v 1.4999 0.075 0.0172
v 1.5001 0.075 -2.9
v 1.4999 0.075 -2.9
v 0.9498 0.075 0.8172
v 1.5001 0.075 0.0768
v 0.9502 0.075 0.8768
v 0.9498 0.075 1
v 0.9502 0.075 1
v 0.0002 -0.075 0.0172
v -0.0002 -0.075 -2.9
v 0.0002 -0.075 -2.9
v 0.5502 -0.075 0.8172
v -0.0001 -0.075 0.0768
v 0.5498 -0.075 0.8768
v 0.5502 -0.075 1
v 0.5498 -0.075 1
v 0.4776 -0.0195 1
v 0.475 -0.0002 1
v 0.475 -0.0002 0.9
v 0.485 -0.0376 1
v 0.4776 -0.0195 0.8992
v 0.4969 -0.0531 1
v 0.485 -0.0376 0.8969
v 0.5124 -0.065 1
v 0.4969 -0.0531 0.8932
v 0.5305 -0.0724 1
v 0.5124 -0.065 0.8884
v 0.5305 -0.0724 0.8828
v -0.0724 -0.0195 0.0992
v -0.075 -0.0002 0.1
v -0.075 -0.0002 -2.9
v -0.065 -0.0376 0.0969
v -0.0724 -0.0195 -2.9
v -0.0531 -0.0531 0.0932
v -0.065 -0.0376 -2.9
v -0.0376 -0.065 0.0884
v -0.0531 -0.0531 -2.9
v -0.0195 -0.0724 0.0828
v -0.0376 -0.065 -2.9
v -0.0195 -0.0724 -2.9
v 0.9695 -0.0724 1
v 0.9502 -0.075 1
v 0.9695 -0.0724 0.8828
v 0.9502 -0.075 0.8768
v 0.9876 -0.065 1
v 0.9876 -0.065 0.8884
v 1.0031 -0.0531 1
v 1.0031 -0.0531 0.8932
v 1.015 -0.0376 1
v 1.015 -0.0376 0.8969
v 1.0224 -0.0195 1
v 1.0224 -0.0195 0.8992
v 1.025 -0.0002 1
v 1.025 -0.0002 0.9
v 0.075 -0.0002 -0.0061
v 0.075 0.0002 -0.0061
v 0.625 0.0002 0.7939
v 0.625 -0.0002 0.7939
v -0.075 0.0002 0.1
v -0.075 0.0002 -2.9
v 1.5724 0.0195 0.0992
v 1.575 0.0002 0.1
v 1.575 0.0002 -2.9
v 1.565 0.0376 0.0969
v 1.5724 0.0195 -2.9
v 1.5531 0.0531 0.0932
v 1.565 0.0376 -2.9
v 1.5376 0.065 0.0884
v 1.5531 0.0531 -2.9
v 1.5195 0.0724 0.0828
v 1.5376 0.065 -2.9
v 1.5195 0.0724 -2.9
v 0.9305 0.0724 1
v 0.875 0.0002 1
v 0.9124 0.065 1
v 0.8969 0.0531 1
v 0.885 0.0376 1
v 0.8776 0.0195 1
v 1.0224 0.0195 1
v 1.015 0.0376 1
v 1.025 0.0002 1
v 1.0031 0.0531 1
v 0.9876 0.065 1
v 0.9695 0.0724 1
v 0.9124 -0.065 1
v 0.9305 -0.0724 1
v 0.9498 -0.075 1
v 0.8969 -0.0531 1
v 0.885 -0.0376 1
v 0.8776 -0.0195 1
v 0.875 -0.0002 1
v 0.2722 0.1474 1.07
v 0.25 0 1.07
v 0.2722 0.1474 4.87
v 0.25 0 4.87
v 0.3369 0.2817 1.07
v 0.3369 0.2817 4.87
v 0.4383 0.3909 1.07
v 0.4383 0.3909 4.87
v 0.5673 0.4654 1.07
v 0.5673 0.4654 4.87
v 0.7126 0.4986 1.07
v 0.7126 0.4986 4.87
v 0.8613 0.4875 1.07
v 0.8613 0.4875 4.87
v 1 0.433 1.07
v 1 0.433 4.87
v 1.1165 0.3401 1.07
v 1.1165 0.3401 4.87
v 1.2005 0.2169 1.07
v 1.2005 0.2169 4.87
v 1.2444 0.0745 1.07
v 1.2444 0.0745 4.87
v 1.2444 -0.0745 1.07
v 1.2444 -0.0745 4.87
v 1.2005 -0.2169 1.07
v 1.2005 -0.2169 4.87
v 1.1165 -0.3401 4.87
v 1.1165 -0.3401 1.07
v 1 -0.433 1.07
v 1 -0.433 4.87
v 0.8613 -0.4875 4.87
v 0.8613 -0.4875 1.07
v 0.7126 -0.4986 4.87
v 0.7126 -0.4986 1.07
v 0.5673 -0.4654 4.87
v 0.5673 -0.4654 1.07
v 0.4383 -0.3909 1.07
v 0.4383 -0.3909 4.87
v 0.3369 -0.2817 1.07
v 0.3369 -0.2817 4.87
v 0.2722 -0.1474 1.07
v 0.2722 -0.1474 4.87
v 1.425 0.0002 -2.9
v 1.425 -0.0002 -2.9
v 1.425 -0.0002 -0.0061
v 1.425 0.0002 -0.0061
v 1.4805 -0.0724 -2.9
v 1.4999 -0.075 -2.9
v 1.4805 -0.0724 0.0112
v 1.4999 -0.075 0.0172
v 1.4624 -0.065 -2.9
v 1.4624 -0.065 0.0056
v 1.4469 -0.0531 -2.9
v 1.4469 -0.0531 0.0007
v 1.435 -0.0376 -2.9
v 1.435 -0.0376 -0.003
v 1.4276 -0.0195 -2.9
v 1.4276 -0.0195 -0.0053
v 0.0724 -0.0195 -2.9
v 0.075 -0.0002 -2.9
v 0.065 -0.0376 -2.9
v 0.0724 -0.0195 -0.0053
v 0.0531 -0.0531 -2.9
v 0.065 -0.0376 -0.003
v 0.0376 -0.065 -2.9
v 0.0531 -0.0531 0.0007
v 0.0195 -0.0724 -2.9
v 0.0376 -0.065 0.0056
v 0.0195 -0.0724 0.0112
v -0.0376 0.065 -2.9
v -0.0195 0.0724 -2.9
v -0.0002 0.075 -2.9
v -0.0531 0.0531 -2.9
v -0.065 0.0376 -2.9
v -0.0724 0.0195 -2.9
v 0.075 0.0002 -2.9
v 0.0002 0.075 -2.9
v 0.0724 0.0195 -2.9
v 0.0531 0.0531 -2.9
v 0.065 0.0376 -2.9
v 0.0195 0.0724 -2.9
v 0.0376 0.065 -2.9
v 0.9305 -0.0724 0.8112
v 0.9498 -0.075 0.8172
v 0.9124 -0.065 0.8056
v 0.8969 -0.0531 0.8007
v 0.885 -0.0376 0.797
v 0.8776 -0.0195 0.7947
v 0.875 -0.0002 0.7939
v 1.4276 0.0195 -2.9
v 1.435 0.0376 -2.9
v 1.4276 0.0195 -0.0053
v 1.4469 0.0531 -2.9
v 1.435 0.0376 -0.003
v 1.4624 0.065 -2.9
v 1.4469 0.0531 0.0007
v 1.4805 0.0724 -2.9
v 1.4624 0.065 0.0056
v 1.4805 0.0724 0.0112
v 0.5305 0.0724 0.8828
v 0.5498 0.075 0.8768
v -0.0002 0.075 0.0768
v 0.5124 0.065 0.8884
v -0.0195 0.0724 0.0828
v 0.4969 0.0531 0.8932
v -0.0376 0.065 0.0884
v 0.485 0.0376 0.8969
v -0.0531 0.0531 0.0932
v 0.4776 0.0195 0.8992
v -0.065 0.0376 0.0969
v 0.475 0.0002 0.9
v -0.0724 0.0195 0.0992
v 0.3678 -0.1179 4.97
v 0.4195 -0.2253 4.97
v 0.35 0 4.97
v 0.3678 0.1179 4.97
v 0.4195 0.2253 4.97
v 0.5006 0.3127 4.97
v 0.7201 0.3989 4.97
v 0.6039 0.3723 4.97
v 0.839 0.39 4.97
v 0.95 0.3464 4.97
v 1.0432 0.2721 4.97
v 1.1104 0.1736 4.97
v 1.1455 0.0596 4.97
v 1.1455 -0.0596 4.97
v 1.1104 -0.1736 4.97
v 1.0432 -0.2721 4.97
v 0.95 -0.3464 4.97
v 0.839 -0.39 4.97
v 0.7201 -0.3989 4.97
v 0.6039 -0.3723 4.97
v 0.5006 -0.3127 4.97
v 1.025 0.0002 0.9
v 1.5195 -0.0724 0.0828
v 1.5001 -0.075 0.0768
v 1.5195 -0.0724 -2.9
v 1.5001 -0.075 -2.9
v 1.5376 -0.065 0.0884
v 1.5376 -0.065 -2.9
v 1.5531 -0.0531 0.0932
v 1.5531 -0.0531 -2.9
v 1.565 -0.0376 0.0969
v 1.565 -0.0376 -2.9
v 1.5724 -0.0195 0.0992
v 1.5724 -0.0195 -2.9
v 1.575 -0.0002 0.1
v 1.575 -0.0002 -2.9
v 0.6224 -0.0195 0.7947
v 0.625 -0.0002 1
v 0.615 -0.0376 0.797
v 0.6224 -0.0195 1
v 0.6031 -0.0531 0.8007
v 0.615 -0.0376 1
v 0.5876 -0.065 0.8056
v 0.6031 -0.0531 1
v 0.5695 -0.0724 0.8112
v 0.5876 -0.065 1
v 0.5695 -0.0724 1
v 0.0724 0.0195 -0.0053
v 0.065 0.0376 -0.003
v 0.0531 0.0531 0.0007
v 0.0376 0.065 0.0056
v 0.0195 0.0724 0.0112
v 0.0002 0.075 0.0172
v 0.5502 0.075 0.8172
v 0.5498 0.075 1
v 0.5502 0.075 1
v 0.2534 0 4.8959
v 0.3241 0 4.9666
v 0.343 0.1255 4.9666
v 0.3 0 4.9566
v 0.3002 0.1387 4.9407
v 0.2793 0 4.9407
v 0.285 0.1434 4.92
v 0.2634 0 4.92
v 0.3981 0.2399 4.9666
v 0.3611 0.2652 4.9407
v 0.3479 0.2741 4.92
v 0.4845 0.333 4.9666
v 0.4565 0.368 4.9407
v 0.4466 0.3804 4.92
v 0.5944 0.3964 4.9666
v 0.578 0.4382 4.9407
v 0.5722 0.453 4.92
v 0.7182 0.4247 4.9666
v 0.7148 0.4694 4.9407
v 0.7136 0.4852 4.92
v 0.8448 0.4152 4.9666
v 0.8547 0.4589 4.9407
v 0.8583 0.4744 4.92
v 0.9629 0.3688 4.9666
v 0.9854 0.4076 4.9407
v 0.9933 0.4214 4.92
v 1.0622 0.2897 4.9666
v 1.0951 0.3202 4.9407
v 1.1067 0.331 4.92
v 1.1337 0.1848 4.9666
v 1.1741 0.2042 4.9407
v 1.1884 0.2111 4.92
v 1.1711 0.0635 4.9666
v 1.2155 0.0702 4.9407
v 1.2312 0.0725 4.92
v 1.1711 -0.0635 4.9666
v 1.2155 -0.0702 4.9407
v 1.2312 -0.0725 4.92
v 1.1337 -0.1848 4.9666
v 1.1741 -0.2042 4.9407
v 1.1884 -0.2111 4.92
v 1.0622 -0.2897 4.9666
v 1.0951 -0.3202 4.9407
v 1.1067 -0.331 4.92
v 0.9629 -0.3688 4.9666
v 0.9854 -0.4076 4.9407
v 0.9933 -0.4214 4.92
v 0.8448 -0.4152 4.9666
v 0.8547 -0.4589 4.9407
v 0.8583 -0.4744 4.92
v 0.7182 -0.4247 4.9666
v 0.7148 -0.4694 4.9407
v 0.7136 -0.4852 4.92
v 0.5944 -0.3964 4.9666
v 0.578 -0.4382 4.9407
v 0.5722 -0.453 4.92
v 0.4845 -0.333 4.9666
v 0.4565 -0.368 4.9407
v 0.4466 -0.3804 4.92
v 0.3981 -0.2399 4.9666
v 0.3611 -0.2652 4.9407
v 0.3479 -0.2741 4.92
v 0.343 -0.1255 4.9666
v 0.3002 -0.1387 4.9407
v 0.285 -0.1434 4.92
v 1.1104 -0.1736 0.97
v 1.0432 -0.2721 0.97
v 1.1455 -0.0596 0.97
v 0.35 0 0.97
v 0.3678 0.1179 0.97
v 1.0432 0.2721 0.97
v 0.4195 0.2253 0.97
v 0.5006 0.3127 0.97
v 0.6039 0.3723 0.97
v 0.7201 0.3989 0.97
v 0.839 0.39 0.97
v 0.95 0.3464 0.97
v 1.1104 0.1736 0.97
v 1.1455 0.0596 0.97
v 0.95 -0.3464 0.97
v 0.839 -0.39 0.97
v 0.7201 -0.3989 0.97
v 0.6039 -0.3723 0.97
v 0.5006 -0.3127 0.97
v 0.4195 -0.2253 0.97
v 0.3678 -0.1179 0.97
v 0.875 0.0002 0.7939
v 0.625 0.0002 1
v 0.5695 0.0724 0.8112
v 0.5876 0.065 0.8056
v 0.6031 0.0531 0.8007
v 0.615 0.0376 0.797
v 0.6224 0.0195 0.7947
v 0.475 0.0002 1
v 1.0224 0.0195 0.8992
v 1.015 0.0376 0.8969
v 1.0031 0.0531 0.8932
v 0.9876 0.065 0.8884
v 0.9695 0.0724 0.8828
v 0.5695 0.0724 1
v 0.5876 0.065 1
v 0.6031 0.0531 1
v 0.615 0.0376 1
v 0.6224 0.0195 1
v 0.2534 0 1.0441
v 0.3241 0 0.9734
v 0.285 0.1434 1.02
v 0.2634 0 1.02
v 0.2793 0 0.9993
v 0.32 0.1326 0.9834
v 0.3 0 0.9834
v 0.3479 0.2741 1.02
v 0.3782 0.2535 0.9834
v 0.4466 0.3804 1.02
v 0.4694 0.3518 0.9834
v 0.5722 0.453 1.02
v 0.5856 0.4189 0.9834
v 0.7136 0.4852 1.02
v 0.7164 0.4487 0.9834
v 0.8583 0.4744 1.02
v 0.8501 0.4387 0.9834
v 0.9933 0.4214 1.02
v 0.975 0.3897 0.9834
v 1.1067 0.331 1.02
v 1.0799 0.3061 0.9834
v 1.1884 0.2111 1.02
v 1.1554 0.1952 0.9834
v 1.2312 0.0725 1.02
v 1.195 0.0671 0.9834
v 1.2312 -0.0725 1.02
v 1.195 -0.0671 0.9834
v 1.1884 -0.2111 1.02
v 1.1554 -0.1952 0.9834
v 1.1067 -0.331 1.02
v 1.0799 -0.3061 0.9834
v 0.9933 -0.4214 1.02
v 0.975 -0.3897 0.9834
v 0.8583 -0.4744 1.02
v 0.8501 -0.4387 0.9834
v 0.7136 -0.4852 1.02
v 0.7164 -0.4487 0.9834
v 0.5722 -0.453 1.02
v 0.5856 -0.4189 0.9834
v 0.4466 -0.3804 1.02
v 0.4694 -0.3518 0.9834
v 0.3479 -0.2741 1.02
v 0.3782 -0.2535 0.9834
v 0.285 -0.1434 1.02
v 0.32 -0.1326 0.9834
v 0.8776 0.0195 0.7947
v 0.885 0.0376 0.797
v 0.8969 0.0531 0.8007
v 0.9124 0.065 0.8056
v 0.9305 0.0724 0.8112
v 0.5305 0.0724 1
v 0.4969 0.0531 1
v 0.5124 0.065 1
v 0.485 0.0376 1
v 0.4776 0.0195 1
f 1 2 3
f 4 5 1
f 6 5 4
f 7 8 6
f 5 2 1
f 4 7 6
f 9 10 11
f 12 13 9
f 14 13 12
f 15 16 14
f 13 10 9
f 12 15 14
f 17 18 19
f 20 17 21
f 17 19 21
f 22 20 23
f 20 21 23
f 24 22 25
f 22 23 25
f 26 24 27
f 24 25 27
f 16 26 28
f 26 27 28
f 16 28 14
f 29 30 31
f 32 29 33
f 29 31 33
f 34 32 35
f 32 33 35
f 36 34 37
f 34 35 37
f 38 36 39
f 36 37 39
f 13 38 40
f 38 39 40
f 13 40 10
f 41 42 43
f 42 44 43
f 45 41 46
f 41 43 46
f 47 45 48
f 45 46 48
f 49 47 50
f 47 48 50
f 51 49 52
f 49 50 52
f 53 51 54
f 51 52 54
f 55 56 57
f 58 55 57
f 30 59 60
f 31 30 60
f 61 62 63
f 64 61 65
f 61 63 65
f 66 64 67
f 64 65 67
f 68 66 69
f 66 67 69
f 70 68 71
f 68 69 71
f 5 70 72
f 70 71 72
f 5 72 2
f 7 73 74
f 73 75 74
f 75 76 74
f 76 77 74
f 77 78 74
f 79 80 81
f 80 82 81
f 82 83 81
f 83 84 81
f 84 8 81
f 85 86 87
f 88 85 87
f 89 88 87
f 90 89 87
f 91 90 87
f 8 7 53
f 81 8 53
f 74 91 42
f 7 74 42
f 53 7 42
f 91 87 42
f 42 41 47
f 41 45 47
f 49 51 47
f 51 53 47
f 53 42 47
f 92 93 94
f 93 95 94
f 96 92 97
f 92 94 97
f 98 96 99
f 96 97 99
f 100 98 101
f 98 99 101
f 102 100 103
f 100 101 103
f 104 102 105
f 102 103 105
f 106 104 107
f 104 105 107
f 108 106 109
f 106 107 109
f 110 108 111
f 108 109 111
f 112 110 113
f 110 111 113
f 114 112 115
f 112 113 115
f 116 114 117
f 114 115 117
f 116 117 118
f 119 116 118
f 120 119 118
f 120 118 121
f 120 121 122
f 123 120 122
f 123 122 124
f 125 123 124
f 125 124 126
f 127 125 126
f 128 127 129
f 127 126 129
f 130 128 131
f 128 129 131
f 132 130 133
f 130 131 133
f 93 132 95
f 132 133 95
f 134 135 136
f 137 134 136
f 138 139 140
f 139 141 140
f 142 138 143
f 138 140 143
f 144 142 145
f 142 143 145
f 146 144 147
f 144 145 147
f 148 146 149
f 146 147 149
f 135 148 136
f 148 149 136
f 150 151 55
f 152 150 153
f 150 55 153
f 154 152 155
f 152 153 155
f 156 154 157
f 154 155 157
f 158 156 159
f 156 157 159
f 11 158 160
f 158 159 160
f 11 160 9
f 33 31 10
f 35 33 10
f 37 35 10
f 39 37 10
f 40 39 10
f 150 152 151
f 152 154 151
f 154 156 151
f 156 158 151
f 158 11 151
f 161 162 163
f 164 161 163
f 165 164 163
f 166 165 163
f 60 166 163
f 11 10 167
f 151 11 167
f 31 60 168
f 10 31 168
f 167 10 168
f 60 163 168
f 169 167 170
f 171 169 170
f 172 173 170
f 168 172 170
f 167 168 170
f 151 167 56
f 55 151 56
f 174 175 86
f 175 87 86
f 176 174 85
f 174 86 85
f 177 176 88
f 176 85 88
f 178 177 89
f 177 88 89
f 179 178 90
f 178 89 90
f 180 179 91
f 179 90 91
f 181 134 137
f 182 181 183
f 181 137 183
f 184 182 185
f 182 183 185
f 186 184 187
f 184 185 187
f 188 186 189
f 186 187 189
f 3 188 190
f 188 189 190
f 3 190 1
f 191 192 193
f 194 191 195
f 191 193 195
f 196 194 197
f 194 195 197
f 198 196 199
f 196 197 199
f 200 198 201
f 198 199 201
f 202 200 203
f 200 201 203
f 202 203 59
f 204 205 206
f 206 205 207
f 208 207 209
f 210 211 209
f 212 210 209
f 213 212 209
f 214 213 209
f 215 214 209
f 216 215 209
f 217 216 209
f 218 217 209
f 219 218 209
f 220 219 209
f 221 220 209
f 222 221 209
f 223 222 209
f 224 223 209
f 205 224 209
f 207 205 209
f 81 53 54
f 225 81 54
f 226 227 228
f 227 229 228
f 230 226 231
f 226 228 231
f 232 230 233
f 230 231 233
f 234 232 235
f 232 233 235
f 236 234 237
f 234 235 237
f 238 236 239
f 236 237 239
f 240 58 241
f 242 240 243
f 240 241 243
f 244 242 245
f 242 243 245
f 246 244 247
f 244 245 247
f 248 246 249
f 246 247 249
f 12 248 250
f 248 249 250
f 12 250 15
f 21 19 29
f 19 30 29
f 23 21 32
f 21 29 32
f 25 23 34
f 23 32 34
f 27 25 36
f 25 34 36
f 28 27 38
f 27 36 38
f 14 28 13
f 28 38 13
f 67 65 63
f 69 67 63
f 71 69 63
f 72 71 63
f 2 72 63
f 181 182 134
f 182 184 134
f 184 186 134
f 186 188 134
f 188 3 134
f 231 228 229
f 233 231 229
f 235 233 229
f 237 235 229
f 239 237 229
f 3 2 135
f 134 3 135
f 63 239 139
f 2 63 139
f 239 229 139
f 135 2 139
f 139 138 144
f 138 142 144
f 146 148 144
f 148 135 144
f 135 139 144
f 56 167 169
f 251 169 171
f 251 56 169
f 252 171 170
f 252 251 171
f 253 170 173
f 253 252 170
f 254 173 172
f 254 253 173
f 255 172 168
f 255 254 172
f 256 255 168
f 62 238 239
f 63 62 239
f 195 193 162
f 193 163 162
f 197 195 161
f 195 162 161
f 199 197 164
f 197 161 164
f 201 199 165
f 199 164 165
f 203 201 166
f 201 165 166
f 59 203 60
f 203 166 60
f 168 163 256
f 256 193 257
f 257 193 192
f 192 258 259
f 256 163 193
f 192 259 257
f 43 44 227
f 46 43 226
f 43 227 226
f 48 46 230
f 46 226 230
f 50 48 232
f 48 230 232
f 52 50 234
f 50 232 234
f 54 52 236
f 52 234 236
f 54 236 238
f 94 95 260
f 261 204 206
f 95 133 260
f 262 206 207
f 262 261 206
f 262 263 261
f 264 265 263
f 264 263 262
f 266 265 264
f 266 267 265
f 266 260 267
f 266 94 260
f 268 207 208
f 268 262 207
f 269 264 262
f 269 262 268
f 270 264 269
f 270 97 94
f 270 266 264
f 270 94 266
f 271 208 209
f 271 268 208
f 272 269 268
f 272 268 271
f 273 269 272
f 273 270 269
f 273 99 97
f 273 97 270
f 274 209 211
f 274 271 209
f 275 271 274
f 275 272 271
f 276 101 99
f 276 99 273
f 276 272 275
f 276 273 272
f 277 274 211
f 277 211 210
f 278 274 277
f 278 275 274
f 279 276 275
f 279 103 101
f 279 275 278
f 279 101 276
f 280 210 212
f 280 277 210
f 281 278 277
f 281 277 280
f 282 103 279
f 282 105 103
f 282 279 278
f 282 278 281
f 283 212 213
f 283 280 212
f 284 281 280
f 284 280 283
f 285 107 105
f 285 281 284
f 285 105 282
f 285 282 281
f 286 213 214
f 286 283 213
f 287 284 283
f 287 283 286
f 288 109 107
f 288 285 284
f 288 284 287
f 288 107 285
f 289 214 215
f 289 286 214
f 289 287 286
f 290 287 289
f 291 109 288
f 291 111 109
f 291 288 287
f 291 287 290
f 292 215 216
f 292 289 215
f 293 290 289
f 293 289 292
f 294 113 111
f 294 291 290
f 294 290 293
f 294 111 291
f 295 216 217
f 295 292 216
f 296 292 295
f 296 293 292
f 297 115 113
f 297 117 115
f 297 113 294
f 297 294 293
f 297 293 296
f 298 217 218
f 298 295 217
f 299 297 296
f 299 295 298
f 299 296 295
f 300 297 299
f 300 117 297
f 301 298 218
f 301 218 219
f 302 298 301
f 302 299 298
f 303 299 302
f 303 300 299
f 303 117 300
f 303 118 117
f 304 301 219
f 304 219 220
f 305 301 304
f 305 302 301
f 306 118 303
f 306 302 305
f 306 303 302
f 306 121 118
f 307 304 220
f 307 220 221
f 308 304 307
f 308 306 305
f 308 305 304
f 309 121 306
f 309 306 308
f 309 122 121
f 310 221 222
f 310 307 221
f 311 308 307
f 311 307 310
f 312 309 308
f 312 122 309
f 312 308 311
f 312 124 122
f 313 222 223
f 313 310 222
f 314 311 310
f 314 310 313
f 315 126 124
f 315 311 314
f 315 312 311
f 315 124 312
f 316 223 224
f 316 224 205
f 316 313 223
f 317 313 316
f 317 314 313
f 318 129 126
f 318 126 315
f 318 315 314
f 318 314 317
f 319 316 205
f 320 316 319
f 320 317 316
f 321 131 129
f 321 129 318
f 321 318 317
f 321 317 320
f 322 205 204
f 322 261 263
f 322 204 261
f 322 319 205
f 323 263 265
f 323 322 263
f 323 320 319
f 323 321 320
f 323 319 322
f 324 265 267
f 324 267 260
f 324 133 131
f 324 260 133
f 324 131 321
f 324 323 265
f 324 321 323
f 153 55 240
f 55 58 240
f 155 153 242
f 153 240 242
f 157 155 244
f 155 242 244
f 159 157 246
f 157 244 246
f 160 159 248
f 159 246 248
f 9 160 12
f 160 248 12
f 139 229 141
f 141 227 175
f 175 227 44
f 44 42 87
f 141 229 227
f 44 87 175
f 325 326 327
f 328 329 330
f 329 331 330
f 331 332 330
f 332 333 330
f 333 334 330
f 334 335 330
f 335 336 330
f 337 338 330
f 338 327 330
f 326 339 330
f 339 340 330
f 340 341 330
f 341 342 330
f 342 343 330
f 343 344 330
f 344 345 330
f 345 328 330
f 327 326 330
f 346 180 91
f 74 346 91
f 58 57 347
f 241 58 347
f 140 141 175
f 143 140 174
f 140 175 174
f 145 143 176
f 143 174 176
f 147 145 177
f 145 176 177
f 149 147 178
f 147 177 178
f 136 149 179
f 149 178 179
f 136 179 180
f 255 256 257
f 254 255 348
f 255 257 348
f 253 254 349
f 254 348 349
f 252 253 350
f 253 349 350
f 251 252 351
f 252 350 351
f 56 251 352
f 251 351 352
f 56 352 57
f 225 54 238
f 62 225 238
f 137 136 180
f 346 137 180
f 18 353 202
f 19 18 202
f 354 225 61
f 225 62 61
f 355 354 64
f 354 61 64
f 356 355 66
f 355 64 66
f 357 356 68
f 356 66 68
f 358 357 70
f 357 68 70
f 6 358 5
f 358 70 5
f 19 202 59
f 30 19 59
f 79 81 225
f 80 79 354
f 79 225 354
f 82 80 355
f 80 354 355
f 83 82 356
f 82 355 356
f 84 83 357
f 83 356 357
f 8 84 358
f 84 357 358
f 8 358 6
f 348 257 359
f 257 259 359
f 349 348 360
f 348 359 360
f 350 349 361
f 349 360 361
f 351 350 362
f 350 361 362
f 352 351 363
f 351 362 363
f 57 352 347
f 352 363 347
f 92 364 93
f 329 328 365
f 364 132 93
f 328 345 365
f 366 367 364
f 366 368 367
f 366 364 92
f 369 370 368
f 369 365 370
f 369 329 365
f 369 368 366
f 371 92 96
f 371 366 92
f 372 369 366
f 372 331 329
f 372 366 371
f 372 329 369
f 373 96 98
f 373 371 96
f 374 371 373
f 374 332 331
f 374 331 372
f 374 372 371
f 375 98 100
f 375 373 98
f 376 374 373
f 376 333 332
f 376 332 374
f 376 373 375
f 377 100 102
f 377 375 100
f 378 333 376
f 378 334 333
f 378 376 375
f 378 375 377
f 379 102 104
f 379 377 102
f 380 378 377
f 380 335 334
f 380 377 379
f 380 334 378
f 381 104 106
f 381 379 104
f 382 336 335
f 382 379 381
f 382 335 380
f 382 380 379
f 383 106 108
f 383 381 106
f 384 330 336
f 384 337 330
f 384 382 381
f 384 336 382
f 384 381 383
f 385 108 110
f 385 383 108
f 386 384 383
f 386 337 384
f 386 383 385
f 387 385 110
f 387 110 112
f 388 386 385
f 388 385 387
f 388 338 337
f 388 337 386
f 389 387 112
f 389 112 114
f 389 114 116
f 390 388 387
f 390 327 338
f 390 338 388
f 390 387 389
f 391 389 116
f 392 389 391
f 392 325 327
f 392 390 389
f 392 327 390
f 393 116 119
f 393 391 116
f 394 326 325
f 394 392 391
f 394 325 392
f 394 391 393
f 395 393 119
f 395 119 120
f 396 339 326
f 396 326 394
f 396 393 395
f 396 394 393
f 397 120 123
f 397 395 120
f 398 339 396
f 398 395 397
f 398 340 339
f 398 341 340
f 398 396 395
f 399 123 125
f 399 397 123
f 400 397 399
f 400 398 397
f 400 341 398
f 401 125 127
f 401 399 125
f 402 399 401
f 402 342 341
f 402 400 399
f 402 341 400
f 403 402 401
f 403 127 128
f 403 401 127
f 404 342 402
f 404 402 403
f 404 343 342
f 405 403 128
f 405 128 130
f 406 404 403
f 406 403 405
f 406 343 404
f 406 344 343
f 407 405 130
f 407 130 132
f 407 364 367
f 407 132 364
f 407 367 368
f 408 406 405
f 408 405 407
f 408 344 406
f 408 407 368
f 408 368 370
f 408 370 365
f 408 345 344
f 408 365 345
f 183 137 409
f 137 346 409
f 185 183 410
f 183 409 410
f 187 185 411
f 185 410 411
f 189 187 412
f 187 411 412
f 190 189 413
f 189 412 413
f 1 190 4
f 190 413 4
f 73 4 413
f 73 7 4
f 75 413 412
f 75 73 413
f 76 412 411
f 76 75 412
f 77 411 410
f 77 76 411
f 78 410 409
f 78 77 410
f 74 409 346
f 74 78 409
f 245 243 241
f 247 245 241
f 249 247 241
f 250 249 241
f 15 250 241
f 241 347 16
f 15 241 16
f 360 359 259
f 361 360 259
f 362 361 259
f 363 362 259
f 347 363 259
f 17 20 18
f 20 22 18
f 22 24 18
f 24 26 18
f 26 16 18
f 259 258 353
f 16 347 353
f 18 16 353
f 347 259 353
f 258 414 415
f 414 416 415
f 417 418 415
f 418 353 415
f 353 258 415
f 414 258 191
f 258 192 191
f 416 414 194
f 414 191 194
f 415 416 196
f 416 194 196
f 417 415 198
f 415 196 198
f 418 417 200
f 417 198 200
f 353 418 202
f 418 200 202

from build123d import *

# Parameters (mm, degrees)
PAD_DEPTH = 0.075
FILLET_R  = 0.07485


with BuildPart() as revolution:
    # Sketch002 → Revolution (revolve)
    with BuildSketch(Plane.XZ):
        with BuildLine():
            Line((0.35, 4.97), (0.75, 4.97))
            Line((0.75, 0.97), (0.75, 4.97))
            Line((0.75, 0.97), (0.35, 0.97))
            ThreePointArc((0.25, 1.07), (0.279289, 0.999289), (0.35, 0.97))
            Line((0.25, 1.07), (0.25, 4.87))
            ThreePointArc((0.35, 4.97), (0.279289, 4.940711), (0.25, 4.87))
        make_face()
    revolve(axis=Axis((0.75, 0, 4.97), (0, 0, -1)))


with BuildPart() as fillet_body:
    # Sketch → Pad (new body, symmetric)
    with BuildSketch(Plane.XZ):
        Polygon((0.075, -2.9), (0.075, -0.006066), (0.625, 0.793934), (0.625, 1), (0.475, 1), (0.475, 0.9), (-0.075, 0.1), (-0.075, -2.9), align=None)
        Polygon((0.875, 1), (1.025, 1), (1.025, 0.9), (1.575, 0.1), (1.575, -2.9), (1.425, -2.9), (1.425, -0.006066), (0.875, 0.793934), align=None)
    extrude(amount=PAD_DEPTH, both=True)

    # Fillet
    fillet_edges = [fillet_body.edges().sort_by_distance(p)[0] for p in [
        (0.2, -0.075, 0.5),
        (0.475, -0.075, 0.95),
        (0.625, -0.075, 0.896967),
        (0.35, -0.075, 0.393934),
        (0.075, -0.075, -1.453033),
        (-0.075, -0.075, -1.4),
        (0.075, 0.075, -1.453033),
        (0.35, 0.075, 0.393934),
        (0.625, 0.075, 0.896967),
        (1.15, -0.075, 0.393934),
        (0.875, -0.075, 0.896967),
        (1.425, -0.075, -1.453033),
        (1.575, -0.075, -1.4),
        (1.3, -0.075, 0.5),
        (1.025, -0.075, 0.95),
        (1.025, 0.075, 0.95),
        (1.3, 0.075, 0.5),
        (1.575, 0.075, -1.4),
        (1.425, 0.075, -1.453033),
        (1.15, 0.075, 0.393934),
        (0.875, 0.075, 0.896967),
        (0.475, 0.075, 0.95),
        (-0.075, 0.075, -1.4),
        (0.2, 0.075, 0.5),
    ]]
    fillet(fillet_edges, radius=FILLET_R)


solid = Compound([revolution.part, fillet_body.part])
